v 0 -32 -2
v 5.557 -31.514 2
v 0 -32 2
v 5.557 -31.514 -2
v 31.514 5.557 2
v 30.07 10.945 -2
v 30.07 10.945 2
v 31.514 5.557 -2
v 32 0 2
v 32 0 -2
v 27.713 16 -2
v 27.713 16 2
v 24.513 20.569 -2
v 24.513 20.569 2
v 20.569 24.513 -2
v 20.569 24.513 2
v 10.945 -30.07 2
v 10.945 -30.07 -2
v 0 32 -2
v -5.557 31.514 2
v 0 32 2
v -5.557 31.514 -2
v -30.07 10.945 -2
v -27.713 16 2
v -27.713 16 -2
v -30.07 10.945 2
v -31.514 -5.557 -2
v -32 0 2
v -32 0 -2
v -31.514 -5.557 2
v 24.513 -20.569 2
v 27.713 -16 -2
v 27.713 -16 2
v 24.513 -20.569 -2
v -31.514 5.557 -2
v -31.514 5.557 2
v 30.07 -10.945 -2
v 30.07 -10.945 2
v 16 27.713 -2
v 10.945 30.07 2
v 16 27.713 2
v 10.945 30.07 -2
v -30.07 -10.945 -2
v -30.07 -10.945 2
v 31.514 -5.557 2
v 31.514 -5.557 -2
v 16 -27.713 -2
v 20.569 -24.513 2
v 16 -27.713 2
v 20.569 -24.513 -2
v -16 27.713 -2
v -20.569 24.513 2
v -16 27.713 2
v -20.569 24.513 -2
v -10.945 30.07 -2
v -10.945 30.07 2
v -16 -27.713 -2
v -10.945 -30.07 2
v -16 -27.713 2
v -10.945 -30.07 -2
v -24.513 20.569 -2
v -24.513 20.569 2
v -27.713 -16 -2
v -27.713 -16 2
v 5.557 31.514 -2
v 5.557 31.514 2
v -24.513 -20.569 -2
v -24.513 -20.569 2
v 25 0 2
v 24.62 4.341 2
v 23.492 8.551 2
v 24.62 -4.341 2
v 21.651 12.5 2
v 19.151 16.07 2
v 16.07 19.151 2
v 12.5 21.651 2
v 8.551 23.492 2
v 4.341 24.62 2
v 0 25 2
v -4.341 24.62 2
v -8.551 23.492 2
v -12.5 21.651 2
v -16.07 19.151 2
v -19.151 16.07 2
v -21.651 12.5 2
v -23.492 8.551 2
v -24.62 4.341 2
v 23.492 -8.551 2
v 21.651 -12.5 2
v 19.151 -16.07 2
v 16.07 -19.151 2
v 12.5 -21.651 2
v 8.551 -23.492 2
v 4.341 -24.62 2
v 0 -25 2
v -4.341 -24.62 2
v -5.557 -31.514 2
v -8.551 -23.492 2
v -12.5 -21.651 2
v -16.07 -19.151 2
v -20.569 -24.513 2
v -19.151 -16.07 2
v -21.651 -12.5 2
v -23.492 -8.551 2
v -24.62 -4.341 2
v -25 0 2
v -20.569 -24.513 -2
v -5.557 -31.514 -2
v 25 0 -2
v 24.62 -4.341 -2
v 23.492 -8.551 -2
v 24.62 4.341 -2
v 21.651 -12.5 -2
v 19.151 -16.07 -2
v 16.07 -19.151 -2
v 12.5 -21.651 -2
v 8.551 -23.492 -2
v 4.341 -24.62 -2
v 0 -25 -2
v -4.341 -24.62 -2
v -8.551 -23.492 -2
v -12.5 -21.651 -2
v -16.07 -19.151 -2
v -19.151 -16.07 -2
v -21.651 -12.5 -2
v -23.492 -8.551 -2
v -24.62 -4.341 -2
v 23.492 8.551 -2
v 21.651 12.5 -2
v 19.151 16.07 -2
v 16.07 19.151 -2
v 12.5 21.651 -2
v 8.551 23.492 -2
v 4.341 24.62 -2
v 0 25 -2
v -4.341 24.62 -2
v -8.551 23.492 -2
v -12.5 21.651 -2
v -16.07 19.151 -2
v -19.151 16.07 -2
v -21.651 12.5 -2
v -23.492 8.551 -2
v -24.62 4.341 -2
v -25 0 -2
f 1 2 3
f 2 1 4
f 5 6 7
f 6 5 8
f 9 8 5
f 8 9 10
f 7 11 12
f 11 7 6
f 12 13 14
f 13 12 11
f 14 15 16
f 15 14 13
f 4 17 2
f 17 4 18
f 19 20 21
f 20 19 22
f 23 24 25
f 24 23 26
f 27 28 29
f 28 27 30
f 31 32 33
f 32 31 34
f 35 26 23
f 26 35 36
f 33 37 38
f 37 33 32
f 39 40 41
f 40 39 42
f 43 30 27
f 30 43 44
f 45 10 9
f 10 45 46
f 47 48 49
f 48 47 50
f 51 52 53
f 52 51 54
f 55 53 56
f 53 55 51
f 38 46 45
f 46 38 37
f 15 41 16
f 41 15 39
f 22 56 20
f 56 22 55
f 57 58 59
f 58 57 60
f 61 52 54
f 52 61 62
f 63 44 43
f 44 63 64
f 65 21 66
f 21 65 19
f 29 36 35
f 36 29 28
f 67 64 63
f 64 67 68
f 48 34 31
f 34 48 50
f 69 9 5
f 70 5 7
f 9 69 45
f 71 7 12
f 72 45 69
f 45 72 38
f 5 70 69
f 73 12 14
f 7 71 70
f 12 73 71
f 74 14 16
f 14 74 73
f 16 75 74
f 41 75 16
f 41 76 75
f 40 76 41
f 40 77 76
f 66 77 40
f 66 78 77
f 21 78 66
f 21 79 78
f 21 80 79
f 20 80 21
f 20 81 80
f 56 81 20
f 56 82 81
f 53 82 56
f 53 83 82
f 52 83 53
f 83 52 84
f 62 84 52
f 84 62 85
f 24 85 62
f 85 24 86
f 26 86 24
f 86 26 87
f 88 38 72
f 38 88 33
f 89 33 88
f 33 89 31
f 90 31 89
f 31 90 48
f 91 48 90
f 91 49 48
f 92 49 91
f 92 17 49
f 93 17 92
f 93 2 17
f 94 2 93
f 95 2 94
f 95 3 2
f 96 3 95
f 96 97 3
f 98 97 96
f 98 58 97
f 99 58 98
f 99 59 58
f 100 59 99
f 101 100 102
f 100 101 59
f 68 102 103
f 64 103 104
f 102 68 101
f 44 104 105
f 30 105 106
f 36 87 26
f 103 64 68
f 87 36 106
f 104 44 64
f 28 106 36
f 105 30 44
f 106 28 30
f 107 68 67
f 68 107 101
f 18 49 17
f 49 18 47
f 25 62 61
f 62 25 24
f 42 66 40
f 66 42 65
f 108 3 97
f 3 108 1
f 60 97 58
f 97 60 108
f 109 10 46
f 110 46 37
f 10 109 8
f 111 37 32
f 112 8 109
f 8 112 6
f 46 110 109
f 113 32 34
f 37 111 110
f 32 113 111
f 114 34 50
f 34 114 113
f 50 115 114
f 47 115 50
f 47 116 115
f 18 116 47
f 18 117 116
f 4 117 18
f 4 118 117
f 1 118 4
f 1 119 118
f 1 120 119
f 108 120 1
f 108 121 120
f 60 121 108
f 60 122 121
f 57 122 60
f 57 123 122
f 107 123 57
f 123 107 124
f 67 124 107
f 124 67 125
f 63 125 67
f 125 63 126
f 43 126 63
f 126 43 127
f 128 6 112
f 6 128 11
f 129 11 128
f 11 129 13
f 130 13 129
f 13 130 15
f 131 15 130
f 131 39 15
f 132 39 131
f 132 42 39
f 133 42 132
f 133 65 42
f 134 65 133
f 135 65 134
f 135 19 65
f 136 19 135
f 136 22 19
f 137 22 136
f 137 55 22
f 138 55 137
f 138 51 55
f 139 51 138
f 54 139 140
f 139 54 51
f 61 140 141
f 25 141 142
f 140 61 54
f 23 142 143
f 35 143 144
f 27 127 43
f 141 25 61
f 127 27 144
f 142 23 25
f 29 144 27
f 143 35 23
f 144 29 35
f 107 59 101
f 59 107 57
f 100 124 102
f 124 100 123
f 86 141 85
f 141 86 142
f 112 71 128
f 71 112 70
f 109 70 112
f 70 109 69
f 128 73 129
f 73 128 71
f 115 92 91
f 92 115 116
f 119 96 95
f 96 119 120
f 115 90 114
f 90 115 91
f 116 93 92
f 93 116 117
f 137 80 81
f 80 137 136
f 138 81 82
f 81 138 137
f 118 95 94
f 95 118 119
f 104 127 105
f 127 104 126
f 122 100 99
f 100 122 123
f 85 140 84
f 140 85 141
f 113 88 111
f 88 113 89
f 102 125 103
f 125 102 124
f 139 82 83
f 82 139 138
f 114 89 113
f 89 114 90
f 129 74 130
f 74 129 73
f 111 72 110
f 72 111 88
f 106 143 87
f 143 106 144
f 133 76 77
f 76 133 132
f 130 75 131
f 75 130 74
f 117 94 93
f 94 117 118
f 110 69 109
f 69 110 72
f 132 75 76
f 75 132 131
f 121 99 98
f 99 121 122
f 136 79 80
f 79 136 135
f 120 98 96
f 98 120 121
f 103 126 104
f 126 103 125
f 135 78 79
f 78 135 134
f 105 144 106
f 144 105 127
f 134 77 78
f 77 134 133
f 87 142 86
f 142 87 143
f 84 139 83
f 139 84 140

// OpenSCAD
// file: ../config.scad
// Shared units: millimeters
$fn = 36;

scale_major = 1.0;
build_plate_mm = 220;
head_width_mm = 160;
head_height_mm = 210;
head_depth_mm = 165;
bearing_clearance_mm = 0.25;
bowden_outer_diameter_mm = 4.0;
eye_display_size_mm = 36;

echo(str("Robot design scale: ", scale_major));
// main file
include <../config.scad>

module gimbal_ring(inner=25, outer=32, thickness=4) {
    difference() {
        cylinder(h=thickness, d=outer * 2, center=true);
        cylinder(h=thickness + 1, d=inner * 2, center=true);
    }
}

gimbal_ring();
